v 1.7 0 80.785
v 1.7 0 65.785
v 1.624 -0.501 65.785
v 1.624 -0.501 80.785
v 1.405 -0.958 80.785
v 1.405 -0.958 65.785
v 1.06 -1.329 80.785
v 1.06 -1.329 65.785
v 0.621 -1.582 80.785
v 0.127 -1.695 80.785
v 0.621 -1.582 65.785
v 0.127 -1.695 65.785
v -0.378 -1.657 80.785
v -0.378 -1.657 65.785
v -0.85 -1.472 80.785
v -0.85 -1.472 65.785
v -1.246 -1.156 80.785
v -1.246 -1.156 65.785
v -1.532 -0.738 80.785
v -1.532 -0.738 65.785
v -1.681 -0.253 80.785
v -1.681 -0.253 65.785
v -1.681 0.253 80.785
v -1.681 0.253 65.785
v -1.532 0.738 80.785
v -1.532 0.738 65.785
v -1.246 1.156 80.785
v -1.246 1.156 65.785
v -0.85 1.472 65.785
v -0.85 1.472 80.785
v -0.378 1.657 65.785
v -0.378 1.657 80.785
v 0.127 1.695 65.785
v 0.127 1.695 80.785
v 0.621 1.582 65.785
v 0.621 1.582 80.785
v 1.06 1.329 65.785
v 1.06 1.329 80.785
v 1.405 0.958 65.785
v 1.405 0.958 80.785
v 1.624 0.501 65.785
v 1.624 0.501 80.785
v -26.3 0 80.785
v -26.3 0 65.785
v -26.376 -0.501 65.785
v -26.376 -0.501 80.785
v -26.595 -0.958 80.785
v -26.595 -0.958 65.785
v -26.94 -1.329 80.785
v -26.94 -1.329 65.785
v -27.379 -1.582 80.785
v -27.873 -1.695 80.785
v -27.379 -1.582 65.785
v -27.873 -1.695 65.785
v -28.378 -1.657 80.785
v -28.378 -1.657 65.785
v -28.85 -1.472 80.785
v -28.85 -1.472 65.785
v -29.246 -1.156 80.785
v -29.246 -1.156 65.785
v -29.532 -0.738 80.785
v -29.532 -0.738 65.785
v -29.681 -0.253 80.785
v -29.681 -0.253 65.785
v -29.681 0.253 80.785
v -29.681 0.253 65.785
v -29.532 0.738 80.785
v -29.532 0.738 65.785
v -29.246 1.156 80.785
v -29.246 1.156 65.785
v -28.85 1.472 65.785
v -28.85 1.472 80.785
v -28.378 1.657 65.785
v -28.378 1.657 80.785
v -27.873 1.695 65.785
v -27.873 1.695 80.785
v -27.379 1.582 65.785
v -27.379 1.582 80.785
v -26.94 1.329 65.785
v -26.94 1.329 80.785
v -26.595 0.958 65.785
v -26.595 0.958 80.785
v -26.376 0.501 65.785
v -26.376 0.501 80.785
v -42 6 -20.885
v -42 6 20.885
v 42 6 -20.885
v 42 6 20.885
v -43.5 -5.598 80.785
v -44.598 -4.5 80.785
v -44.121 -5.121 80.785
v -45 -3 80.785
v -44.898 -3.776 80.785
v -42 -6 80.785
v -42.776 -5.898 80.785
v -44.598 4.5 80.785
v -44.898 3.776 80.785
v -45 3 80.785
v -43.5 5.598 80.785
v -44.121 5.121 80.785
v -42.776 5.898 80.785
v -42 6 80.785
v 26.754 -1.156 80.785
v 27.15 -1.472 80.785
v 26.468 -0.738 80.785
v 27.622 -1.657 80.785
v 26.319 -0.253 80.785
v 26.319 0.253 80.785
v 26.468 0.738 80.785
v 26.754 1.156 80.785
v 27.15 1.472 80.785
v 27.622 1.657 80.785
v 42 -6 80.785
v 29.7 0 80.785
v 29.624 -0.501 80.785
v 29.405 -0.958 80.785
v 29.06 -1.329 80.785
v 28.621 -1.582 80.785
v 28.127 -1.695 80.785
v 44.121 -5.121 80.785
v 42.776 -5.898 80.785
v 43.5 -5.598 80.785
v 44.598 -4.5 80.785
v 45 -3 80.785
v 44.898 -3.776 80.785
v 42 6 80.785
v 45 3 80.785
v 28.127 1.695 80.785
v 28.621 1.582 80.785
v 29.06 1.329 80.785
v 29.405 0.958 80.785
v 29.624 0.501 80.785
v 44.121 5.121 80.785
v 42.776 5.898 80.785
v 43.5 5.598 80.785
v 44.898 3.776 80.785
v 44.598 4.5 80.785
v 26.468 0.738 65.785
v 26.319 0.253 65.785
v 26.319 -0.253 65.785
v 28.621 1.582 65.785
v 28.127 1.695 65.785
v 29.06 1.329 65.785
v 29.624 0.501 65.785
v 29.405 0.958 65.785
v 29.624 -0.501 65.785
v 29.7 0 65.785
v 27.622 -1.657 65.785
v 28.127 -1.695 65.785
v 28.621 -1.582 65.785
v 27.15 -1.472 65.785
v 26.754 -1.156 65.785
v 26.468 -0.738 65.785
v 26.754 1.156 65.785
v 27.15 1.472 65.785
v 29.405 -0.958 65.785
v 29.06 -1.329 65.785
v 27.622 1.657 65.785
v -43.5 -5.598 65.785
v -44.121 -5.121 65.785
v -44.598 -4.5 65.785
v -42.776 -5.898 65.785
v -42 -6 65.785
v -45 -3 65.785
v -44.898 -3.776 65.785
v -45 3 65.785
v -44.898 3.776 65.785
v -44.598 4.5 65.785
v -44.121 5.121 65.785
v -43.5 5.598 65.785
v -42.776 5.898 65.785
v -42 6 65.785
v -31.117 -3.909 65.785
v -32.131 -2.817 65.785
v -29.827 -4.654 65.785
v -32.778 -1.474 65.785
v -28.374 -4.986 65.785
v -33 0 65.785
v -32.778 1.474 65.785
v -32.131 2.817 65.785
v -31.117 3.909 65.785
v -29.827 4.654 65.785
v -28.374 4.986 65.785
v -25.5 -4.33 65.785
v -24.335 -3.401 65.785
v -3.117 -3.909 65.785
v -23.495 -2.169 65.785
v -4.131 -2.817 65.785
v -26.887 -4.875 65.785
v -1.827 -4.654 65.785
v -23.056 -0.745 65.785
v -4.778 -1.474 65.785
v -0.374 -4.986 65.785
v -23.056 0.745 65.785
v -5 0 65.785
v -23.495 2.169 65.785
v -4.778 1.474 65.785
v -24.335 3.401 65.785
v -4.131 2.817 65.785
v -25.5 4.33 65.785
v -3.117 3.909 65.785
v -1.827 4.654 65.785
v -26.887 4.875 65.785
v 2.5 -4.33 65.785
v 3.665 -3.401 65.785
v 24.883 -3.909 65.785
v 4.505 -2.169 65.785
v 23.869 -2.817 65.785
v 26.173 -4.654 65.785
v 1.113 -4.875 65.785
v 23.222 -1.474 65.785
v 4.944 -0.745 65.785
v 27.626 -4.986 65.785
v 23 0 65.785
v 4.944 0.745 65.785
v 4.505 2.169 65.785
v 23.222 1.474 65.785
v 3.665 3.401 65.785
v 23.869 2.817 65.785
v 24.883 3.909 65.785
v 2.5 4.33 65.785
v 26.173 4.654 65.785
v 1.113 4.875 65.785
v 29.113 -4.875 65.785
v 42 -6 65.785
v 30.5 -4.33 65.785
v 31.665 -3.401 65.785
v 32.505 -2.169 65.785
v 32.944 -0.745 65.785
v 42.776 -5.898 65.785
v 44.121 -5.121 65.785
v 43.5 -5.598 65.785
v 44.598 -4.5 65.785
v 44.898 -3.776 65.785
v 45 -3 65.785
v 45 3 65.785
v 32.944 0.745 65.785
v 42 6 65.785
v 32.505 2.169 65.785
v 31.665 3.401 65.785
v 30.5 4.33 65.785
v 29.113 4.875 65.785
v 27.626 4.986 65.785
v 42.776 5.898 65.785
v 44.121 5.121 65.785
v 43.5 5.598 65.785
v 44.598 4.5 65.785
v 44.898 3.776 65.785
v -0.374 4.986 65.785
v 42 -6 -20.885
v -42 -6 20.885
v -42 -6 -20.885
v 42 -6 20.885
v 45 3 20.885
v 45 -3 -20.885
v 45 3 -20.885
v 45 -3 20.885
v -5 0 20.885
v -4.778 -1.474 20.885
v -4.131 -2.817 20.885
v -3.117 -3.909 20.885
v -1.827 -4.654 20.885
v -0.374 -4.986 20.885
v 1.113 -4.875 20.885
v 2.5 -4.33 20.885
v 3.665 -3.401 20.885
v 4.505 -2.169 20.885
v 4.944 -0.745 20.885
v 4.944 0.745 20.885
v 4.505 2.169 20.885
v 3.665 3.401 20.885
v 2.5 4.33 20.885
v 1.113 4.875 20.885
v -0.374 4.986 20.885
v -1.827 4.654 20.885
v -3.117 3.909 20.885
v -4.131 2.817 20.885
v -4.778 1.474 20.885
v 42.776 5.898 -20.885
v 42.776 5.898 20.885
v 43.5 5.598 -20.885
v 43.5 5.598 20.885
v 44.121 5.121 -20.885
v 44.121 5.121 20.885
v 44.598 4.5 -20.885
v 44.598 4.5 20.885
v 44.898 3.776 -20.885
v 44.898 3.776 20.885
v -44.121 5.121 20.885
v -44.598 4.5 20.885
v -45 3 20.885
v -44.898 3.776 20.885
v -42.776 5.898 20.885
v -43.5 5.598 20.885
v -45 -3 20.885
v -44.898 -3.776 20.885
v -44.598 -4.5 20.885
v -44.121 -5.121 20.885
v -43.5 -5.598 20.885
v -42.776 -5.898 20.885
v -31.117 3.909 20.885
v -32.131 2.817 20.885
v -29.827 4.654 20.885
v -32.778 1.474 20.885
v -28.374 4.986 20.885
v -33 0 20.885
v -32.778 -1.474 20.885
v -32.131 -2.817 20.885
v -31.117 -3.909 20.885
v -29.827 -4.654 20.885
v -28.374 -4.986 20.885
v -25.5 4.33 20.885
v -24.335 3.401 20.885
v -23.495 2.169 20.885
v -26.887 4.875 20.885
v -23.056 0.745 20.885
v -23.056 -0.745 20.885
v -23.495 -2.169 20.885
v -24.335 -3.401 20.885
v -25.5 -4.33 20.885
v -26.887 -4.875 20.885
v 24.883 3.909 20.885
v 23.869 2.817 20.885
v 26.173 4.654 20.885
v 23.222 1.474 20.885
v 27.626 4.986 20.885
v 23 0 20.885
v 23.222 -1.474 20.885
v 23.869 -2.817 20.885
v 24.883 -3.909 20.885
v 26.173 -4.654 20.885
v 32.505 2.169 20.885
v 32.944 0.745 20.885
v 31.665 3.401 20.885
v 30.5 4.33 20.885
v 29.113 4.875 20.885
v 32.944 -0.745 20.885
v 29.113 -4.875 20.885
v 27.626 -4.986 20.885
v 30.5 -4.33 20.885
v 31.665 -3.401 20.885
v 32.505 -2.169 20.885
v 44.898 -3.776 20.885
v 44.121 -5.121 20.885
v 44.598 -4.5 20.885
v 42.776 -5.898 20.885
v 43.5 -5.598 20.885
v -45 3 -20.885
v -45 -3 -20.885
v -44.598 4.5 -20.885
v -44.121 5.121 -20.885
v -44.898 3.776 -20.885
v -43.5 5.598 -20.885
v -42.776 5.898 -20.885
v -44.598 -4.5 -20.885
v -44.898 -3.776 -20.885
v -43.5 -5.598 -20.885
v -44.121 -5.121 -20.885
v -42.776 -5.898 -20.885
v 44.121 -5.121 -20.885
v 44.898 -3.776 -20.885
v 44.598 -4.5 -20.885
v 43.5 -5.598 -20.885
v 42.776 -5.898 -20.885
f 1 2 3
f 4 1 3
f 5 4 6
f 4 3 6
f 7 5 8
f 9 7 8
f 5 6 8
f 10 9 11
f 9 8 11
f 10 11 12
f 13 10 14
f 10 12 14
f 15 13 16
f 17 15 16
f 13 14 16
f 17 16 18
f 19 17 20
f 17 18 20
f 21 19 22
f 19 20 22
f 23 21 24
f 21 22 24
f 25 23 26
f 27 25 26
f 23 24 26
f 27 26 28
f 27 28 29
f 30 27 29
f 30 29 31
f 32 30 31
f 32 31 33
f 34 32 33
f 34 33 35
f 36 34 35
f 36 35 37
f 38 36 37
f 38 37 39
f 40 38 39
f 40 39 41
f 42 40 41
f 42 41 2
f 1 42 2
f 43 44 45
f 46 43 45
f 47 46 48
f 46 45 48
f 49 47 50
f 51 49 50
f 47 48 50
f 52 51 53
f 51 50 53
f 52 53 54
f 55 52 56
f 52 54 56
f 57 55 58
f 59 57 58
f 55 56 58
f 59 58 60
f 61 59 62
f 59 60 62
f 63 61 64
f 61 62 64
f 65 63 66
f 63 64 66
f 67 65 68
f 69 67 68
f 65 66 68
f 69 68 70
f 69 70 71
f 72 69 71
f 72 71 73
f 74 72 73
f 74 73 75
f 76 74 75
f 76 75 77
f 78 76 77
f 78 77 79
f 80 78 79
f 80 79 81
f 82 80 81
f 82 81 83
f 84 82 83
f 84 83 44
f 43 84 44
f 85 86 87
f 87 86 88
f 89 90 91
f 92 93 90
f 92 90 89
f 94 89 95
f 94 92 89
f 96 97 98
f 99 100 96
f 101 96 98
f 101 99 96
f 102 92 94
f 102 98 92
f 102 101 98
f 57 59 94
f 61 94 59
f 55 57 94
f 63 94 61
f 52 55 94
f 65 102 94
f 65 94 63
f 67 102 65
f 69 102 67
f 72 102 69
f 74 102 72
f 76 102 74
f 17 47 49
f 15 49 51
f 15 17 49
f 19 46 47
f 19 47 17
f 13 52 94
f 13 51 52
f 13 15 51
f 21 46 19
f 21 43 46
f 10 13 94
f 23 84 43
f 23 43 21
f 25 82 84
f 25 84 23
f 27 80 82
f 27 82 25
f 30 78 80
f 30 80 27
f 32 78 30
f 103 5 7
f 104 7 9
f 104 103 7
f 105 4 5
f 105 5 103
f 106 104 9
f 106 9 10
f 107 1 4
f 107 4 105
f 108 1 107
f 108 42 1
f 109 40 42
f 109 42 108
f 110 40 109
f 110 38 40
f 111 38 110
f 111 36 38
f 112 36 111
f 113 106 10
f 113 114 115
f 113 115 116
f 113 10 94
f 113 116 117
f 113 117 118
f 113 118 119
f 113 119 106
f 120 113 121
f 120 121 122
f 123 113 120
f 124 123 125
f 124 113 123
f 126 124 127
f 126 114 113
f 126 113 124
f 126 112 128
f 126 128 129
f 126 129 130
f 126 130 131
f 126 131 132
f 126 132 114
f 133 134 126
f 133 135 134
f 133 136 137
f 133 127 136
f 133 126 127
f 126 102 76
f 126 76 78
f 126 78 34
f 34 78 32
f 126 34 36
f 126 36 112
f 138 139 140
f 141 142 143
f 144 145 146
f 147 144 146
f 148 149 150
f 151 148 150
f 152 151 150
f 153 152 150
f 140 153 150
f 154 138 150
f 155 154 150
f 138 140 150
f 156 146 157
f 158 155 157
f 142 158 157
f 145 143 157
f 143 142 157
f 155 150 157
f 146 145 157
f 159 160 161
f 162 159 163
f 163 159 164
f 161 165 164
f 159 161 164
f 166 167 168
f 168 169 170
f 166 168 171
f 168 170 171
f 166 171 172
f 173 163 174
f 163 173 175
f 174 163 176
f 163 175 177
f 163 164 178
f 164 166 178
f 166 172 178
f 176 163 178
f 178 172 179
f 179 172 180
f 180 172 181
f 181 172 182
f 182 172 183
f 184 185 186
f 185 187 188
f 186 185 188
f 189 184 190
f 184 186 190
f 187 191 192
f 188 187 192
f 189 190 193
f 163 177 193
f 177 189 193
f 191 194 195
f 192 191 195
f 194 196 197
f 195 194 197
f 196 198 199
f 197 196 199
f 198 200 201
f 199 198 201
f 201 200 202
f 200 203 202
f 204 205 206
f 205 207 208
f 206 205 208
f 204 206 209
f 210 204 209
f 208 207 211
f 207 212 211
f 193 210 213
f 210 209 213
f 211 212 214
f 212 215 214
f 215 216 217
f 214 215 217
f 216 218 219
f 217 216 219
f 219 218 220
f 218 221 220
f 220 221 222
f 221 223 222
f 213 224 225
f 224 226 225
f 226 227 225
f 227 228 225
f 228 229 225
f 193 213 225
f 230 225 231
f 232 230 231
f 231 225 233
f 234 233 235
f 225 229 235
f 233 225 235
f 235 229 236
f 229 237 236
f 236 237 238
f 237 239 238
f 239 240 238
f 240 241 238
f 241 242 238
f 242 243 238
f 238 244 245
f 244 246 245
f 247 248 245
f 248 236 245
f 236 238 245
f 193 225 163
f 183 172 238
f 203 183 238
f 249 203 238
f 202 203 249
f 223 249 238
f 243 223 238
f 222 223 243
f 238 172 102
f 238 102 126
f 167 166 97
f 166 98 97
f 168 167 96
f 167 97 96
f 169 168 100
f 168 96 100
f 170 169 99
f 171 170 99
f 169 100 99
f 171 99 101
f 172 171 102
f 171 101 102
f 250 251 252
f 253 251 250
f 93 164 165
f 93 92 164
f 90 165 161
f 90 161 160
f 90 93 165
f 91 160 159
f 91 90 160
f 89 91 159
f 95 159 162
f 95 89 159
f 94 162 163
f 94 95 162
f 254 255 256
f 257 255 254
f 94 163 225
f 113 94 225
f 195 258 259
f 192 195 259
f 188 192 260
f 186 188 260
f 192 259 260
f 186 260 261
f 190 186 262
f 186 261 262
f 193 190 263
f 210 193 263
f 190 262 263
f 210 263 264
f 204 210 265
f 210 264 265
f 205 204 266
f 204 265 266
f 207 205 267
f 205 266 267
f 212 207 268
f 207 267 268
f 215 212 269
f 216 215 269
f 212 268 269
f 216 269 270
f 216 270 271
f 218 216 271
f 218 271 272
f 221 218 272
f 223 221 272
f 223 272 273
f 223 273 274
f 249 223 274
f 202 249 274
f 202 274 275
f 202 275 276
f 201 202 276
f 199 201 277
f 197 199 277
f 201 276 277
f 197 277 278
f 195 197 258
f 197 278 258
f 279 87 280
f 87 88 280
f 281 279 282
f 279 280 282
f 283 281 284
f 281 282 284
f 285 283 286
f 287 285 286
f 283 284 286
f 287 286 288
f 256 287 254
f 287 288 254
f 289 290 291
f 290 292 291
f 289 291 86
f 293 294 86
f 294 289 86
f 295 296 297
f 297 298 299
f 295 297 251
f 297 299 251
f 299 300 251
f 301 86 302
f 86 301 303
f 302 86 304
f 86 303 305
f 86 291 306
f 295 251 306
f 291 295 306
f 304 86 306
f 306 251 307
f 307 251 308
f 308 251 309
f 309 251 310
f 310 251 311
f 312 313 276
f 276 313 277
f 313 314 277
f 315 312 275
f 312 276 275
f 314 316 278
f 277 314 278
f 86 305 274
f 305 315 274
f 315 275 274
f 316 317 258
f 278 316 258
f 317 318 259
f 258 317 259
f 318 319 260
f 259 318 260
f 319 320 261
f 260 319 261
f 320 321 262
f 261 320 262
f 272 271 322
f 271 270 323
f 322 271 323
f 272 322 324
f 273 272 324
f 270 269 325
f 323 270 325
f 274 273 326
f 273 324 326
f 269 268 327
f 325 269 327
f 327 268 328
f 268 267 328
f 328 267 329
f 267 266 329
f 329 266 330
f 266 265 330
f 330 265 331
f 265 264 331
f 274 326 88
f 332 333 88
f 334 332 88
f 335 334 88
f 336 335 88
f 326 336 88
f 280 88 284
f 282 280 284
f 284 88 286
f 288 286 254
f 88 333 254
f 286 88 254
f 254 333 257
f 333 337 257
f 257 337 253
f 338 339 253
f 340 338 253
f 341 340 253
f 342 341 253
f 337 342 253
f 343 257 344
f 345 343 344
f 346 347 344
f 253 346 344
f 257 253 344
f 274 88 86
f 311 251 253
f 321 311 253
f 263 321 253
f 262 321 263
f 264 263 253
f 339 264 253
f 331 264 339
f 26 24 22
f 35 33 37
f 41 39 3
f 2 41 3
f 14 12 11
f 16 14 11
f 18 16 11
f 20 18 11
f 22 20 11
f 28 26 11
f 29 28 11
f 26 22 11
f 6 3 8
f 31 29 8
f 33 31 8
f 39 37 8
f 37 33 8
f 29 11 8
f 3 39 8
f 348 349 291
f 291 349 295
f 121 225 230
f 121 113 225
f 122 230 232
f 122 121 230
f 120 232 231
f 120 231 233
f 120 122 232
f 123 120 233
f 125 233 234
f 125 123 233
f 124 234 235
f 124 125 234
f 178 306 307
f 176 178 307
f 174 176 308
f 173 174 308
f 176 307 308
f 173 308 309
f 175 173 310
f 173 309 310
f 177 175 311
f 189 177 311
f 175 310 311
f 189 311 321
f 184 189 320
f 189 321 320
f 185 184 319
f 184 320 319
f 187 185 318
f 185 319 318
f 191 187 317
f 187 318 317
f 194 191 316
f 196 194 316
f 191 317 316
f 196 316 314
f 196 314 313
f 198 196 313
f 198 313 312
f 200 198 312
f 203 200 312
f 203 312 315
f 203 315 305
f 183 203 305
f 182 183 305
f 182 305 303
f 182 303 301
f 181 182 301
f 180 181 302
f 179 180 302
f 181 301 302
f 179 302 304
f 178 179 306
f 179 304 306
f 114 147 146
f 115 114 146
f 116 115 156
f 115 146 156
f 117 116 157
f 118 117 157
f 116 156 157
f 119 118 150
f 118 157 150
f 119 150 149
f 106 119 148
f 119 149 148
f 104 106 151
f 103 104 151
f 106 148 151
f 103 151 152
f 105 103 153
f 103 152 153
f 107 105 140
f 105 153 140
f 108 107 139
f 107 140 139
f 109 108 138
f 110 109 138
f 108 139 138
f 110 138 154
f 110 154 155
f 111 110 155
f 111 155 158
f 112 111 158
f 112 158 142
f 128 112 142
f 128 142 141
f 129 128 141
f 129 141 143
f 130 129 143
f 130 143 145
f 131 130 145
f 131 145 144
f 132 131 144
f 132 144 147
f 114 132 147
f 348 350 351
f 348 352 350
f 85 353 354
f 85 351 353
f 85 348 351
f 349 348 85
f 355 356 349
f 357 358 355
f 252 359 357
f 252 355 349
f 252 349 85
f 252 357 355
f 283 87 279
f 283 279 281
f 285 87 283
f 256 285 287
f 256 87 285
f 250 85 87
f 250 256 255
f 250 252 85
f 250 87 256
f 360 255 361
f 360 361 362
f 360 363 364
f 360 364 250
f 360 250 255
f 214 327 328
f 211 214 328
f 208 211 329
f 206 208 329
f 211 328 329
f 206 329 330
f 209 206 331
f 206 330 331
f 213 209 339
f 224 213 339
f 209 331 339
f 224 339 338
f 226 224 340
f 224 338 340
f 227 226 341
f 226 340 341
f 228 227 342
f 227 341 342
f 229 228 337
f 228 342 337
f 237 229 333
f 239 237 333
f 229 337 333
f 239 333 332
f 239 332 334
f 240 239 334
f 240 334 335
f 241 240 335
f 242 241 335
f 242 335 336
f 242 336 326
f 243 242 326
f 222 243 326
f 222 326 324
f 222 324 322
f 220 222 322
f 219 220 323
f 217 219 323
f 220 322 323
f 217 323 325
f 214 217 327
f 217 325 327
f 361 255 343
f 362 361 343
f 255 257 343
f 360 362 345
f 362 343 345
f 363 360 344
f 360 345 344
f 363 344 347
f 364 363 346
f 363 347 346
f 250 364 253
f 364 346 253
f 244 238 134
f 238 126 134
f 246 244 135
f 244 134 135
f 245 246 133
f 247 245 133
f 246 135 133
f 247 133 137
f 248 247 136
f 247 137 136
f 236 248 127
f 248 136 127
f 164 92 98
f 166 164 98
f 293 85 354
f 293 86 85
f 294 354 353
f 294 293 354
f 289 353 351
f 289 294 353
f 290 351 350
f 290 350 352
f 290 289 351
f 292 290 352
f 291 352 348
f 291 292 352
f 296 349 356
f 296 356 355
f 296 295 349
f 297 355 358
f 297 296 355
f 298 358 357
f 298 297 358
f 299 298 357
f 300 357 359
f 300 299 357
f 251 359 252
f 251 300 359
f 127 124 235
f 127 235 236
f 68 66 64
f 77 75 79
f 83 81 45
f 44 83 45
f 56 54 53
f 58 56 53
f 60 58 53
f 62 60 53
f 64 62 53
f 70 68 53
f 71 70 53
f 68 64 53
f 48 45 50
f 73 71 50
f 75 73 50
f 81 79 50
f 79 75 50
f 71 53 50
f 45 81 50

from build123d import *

# Parameters (mm, degrees)
F0_W     = 90
F0_H     = 41.77
F1_DEPTH = 6
F3_DEPTH = 44.9
F4_W     = 90
F4_H     = 12
F4_R     = 5
F5_DEPTH = 15
F6_R     = 3
F7_R     = 1.7
F8_DEPTH = 20


with BuildPart() as f1:
    # F0 (on Front) → F1 (new body, symmetric)
    with BuildSketch(Plane.XZ):
        Rectangle(F0_W, F0_H)
    extrude(amount=F1_DEPTH, both=True)

    # F2 (on face) → F3 (join)
    with BuildSketch(Plane.XY.offset(20.885)):
        with BuildLine():
            Line((-28, 0), (-23, 0))
            ThreePointArc((-23, 0), (-28, 5), (-33, 0))
            Line((-33, 0), (-28, 0))
        make_face()
        with BuildLine():
            ThreePointArc((-33, 0), (-28, -5), (-23, 0))
            Line((-23, 0), (-28, 0))
            Line((-28, 0), (-33, 0))
        make_face()
        with BuildLine():
            Line((-5, 0), (0, 0))
            Line((0, 0), (5, 0))
            ThreePointArc((5, 0), (0, 5), (-5, 0))
        make_face()
        with BuildLine():
            Line((5, 0), (0, 0))
            Line((0, 0), (-5, 0))
            ThreePointArc((-5, 0), (0, -5), (5, 0))
        make_face()
        with BuildLine():
            ThreePointArc((33, 0), (28, 5), (23, 0))
            ThreePointArc((23, 0), (28, -5), (33, 0))
        make_face()
    extrude(amount=F3_DEPTH)

    # F4 (on face) → F5 (join)
    with BuildSketch(Plane.XY.offset(65.785)):
        Rectangle(F4_W, F4_H)
        with Locations((-28, 0)):
            Circle(F4_R, mode=Mode.SUBTRACT)
        with Locations((-28, 0)):
            Circle(F4_R)
    extrude(amount=F5_DEPTH)

    # F6
    f6_edges = [f1.edges().sort_by_distance(p)[0] for p in [
        (45, -6, 0),
        (45, 6, 0),
        (-45, -6, 0),
        (-45, 6, 0),
        (-45, 6, 73.285),
        (-45, -6, 73.285),
        (45, -6, 73.285),
        (45, 6, 73.285),
    ]]
    fillet(f6_edges, radius=F6_R)

    # F7 (on face) → F8 (cut)
    with BuildSketch(Plane(origin=(0, 0, 65.785), x_dir=(1, 0, 0), z_dir=(0, 0, -1))):
        with Locations((-28, 0)):
            Circle(F7_R)
        Circle(F7_R)
        with Locations((28, 0)):
            Circle(F7_R)
    extrude(amount=-F8_DEPTH, mode=Mode.SUBTRACT)


solid = f1.part
